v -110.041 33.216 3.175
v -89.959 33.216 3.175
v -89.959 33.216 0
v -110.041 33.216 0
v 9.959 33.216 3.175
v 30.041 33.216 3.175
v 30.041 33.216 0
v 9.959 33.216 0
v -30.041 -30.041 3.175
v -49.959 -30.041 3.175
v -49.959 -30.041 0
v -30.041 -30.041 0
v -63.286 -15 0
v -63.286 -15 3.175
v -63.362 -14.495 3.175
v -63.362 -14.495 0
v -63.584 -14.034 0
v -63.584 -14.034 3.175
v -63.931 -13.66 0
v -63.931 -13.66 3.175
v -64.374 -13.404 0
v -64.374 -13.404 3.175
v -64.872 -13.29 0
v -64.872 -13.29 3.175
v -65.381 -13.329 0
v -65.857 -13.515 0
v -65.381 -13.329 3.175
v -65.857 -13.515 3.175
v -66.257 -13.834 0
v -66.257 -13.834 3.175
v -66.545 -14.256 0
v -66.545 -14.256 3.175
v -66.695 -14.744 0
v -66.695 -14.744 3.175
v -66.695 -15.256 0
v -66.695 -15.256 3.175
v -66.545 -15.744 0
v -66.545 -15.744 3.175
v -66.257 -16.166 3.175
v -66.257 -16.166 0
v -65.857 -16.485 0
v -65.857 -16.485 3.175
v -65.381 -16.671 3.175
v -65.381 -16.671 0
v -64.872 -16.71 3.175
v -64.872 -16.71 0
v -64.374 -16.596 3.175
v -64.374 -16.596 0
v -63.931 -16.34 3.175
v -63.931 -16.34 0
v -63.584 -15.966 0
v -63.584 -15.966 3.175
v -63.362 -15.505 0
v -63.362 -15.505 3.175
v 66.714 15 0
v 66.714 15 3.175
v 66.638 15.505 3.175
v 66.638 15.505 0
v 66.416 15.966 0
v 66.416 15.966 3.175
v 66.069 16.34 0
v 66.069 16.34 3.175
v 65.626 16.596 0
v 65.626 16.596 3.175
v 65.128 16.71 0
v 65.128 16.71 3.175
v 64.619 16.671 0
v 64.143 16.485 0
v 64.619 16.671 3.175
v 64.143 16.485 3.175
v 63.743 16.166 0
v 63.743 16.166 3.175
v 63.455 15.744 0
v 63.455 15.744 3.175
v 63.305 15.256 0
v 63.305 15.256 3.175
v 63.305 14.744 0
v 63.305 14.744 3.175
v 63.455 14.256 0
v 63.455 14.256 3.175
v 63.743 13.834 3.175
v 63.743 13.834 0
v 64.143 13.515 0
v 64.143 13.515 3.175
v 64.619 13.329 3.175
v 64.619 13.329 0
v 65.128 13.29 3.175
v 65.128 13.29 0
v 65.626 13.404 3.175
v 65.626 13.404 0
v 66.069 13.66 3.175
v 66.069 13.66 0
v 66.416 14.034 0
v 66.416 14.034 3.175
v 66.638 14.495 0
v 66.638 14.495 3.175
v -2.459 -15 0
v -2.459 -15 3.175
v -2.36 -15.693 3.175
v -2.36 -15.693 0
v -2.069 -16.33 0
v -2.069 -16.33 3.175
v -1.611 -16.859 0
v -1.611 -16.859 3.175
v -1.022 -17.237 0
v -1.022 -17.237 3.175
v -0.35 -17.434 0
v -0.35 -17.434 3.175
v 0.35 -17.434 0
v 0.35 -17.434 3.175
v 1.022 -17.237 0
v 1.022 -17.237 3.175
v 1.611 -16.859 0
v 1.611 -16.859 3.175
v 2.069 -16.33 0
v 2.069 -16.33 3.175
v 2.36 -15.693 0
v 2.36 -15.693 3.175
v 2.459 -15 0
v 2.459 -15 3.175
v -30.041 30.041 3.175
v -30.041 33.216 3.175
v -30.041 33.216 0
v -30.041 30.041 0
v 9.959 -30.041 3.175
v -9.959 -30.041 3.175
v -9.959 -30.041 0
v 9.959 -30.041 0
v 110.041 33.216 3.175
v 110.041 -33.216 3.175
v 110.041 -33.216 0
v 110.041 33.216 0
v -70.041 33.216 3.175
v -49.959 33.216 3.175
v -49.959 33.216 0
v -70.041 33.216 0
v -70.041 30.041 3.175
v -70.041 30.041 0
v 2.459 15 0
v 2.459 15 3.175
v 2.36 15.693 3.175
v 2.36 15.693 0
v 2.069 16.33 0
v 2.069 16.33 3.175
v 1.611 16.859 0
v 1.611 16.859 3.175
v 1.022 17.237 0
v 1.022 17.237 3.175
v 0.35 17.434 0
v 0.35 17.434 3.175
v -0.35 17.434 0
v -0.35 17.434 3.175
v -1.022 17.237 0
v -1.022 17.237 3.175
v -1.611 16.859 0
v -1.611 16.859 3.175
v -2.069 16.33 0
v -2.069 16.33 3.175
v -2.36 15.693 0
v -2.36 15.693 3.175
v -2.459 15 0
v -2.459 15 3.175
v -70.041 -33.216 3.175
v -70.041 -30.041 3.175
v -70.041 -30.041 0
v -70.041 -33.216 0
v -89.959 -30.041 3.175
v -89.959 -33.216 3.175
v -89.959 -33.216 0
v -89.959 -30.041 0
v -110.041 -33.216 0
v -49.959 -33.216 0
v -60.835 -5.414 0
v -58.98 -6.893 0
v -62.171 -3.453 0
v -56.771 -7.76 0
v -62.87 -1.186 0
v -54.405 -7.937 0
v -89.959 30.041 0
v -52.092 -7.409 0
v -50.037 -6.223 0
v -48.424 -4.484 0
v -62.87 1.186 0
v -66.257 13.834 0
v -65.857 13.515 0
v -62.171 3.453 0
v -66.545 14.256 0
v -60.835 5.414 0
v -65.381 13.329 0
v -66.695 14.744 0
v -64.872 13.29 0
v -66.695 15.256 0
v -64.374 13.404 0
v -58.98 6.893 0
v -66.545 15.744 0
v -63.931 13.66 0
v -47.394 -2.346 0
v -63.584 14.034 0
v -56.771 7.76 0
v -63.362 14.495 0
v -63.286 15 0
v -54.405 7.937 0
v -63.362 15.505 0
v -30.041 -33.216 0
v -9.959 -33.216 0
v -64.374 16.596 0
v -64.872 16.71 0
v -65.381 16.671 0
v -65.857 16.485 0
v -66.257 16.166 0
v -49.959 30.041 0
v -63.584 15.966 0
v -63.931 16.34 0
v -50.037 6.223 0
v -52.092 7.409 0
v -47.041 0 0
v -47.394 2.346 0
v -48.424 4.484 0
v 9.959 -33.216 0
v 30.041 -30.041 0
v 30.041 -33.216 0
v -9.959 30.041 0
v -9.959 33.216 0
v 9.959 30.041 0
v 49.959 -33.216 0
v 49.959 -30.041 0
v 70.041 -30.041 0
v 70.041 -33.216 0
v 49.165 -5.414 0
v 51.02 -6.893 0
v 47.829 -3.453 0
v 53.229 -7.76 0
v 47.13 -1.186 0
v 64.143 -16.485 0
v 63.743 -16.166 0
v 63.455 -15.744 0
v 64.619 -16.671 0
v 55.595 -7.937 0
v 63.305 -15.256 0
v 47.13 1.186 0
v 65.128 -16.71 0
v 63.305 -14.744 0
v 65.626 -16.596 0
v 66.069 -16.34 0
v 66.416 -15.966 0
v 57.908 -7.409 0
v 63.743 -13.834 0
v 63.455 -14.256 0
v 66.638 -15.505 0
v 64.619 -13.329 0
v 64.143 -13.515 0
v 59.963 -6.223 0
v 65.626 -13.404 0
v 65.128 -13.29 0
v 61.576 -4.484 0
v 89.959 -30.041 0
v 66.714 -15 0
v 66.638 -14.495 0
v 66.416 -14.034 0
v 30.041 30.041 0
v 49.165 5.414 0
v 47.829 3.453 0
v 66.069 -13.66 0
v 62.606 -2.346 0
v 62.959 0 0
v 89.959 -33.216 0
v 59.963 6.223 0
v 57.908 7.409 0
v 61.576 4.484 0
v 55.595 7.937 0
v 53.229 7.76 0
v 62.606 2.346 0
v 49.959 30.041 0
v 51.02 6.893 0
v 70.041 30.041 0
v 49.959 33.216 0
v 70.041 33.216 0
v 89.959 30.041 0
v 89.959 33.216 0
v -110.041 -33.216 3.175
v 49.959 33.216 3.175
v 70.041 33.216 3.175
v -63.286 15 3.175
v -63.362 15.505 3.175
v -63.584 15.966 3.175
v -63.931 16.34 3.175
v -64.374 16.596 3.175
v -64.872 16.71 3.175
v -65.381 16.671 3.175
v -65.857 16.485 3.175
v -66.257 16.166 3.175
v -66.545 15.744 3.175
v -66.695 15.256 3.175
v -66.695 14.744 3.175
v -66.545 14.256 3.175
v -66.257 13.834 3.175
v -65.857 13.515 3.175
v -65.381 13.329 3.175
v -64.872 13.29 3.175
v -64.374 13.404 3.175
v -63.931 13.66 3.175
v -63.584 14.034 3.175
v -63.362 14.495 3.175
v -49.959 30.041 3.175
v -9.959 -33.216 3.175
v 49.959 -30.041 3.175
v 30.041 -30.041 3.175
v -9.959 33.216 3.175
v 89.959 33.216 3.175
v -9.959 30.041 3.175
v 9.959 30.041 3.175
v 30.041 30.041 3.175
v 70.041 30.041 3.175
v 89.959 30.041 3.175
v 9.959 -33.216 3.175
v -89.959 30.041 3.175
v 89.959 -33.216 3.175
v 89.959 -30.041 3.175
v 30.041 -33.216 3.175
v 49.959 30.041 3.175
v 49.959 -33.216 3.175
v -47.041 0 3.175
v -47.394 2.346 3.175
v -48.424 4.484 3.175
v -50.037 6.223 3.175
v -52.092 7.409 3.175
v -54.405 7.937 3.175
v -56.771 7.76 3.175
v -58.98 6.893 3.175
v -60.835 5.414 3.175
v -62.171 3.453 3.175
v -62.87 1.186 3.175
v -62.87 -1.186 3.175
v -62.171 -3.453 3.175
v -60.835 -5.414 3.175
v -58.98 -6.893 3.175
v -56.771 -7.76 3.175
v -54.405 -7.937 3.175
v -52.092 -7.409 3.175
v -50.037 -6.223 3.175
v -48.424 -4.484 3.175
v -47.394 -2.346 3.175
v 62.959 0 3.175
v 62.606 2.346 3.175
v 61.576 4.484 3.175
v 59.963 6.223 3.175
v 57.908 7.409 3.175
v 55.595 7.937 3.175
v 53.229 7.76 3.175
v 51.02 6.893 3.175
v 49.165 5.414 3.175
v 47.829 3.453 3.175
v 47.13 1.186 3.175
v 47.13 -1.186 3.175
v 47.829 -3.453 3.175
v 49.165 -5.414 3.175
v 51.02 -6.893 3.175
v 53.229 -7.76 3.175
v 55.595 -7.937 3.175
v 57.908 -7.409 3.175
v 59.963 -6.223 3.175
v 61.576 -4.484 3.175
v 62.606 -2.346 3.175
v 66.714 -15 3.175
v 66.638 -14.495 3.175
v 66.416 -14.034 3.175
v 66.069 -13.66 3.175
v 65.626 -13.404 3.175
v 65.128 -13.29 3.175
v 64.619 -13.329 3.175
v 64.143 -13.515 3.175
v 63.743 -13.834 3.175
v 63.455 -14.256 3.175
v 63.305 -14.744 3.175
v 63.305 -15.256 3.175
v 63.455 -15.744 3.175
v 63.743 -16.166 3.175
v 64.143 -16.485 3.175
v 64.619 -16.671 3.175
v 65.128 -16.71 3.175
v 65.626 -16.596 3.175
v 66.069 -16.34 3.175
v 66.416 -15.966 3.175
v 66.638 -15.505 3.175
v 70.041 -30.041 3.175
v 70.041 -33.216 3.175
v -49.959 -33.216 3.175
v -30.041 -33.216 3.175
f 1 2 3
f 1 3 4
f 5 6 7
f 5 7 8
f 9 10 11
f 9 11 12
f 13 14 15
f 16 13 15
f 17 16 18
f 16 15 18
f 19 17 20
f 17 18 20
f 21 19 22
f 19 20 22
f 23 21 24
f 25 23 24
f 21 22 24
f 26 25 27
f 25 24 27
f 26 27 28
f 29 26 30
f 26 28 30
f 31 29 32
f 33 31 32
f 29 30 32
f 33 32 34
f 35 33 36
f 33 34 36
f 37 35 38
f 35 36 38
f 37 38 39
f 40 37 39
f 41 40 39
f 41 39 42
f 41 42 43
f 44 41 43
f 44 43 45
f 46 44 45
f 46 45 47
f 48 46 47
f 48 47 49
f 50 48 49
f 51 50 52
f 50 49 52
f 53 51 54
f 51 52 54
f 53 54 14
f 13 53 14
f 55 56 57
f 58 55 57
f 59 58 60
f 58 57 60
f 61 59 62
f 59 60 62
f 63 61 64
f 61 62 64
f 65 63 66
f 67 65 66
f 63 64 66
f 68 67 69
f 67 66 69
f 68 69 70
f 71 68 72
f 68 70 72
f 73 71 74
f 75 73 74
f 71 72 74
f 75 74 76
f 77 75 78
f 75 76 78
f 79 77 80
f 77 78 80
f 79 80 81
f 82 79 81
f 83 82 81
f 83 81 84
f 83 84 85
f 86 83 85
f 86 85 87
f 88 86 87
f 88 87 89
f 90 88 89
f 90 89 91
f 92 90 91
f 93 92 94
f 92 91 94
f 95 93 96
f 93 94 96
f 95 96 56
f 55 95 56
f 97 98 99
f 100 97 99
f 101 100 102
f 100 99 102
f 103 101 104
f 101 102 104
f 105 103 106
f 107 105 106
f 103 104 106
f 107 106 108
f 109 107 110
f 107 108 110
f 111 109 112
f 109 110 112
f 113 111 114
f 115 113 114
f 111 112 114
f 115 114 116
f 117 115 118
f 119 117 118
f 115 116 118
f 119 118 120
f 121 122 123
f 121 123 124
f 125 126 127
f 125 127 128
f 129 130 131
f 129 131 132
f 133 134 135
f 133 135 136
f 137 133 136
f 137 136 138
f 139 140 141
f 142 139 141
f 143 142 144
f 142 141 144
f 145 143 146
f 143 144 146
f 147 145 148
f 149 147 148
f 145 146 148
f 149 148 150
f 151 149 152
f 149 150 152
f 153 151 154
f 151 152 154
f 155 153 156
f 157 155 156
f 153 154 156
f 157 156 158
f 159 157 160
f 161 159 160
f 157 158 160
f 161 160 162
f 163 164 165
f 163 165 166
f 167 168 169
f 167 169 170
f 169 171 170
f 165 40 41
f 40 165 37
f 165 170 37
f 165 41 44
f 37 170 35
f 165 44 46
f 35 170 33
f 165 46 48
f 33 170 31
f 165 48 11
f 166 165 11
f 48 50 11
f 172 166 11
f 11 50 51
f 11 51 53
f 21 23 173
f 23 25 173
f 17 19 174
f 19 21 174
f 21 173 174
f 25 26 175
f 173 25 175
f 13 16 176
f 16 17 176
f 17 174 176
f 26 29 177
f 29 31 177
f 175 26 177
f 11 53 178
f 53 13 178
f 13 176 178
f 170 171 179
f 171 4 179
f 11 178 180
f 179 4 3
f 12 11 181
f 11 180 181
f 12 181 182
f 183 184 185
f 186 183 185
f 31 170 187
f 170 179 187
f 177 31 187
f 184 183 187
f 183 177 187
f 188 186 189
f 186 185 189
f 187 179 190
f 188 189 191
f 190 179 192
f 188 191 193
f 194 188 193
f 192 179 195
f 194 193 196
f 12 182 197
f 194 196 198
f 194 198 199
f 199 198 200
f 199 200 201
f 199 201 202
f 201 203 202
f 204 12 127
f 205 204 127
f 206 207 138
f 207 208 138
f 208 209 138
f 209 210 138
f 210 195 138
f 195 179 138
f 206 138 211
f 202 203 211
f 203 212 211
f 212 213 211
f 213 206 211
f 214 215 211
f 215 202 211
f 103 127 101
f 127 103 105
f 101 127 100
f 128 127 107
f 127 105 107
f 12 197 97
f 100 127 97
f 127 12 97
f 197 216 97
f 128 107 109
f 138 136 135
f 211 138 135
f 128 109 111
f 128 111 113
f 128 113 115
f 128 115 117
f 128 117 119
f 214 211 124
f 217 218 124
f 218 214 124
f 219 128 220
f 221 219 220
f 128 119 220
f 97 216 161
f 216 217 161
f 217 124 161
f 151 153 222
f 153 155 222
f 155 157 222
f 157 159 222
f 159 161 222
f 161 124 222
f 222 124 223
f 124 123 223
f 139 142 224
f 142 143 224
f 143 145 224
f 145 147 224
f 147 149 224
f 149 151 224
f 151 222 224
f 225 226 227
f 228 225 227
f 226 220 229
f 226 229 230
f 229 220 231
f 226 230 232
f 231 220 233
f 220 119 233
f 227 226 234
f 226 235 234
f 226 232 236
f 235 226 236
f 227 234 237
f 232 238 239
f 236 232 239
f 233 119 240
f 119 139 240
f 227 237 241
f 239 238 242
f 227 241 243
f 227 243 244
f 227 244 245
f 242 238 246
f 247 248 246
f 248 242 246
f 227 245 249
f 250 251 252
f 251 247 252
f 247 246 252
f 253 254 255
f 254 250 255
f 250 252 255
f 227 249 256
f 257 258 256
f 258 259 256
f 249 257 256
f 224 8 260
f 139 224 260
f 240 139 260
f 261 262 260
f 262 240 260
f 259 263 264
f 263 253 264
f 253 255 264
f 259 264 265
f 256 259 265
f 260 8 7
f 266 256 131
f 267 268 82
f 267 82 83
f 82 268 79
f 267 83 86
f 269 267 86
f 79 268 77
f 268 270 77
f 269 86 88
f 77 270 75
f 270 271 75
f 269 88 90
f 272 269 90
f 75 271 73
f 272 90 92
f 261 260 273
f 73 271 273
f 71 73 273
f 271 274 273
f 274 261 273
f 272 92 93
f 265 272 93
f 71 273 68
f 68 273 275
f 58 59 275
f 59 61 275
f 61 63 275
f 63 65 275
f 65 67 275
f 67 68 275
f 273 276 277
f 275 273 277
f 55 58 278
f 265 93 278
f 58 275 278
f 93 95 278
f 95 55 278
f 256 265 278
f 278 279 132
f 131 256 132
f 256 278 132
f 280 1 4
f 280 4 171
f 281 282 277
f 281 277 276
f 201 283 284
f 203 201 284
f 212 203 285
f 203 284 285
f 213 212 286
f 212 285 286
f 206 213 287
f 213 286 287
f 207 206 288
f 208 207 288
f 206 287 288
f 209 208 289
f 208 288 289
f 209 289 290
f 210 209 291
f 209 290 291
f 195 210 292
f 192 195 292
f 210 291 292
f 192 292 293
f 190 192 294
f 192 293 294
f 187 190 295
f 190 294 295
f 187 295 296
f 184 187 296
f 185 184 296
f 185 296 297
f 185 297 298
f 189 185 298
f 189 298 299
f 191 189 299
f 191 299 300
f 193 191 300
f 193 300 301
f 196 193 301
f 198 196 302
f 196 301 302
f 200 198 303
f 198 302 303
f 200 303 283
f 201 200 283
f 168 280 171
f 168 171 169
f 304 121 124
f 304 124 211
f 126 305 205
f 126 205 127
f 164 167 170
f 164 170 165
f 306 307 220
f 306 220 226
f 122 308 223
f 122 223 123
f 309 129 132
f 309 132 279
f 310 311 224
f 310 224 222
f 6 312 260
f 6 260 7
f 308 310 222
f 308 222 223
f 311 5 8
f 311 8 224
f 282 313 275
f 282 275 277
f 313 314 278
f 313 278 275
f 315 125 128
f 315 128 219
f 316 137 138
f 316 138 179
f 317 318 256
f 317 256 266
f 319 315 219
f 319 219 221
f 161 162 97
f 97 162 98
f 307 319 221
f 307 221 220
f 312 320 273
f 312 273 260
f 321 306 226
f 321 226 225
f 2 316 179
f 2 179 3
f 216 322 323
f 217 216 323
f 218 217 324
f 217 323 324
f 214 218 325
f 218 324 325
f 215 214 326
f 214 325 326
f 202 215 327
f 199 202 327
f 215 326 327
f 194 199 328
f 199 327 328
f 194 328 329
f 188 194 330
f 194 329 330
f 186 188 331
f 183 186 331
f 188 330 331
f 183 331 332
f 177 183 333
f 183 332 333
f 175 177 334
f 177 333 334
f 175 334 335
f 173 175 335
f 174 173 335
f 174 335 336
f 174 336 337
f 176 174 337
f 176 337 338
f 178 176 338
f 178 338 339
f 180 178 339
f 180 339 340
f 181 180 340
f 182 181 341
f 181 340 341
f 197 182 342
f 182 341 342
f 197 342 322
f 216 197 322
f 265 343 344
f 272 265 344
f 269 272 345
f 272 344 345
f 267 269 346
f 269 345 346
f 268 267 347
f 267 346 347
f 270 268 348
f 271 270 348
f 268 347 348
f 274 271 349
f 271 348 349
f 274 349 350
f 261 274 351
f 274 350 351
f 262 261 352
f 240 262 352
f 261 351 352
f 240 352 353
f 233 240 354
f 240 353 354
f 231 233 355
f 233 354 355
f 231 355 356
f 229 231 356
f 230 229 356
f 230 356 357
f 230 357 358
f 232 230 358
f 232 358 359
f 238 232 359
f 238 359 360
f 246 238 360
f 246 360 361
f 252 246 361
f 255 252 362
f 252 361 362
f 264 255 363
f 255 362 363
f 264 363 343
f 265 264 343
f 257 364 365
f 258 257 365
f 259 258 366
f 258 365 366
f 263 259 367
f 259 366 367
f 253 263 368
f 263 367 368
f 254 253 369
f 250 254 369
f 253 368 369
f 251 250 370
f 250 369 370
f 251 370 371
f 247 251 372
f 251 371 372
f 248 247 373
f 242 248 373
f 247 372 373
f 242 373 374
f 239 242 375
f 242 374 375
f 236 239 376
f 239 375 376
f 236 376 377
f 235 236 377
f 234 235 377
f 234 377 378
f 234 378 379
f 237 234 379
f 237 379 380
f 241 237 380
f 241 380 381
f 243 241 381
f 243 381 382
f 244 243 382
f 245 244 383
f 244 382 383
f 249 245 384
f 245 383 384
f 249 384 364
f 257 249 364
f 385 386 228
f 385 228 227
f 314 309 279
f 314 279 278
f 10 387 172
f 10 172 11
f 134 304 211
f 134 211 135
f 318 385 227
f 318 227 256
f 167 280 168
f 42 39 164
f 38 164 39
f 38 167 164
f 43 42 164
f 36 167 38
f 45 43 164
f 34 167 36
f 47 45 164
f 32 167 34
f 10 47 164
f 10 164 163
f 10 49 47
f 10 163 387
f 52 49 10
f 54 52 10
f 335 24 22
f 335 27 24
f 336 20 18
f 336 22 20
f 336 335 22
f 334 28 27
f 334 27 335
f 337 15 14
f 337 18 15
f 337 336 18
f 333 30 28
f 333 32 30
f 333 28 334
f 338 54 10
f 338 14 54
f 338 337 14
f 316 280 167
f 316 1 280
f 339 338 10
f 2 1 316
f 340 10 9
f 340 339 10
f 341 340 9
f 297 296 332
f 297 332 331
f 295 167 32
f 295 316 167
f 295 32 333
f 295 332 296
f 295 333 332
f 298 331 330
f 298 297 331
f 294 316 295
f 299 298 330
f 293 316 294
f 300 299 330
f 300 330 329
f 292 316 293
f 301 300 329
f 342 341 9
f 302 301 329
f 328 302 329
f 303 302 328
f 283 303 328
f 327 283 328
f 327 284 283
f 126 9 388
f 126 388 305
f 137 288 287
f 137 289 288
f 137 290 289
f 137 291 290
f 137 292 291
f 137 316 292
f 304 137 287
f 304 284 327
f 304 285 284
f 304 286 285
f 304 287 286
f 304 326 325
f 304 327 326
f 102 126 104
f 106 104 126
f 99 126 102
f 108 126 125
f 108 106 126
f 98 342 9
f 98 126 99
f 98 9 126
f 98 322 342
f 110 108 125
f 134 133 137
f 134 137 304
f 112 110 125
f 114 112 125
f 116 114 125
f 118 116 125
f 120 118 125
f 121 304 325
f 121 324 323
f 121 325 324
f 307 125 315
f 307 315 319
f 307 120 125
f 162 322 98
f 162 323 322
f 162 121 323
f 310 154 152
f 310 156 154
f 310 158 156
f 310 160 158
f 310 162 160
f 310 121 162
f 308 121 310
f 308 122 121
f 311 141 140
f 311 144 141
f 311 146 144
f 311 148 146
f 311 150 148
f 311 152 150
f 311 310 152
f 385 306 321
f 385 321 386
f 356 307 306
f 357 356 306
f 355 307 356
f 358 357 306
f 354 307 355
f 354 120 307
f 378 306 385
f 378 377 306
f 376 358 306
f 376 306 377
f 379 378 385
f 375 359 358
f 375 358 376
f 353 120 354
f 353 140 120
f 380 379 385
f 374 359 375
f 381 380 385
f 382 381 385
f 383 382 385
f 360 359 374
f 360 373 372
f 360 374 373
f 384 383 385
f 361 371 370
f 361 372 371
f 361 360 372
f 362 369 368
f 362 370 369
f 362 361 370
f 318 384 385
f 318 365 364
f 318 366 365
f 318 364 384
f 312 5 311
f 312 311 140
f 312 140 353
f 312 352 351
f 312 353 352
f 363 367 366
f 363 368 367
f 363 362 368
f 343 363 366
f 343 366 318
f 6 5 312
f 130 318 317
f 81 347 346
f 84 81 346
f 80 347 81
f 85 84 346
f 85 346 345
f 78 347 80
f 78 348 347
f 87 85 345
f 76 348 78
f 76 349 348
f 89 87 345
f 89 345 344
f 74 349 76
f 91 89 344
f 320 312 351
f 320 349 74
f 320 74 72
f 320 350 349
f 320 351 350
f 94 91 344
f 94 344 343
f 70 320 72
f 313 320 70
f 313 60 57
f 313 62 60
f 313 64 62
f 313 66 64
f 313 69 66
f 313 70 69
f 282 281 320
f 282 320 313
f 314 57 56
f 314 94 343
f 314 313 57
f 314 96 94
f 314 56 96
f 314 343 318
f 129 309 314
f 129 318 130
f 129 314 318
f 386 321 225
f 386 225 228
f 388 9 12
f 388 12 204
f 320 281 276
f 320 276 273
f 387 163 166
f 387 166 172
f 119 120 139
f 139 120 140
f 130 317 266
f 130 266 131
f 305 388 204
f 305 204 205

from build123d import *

# Parameters (mm, degrees)
SKETCH1_R           = 1.755
SKETCH1_R_2         = 8
BOSS_EXTRUDE1_DEPTH = 3.175
SKETCH2_R           = 7.95936
SKETCH2_R_2         = 1.71436
BOSS_EXTRUDE2_DEPTH = 3.175


with BuildPart() as part:
    # Sketch1 → Boss-Extrude1 (new body)
    with BuildSketch(Plane.XY):
        Polygon((-50, 30), (-50, 33.175), (-70, 33.175), (-70, 30), (-90, 30), (-90, 33.175), (-110, 33.175), (-110, -33.175), (-90, -33.175), (-90, -30), (-70, -30), (-70, -33.175), (-50, -33.175), (-50, -30), (-30, -30), (-30, -33.175), (-10, -33.175), (-10, -30), (10, -30), (10, -33.175), (30, -33.175), (30, -30), (50, -30), (50, -33.175), (70, -33.175), (70, -30), (90, -30), (90, -33.175), (110, -33.175), (110, 33.175), (90, 33.175), (90, 30), (70, 30), (70, 33.175), (50, 33.175), (50, 30), (30, 30), (30, 33.175), (10, 33.175), (10, 30), (-10, 30), (-10, 33.175), (-30, 33.175), (-30, 30), align=None)
        with Locations((-65, -15)):
            Circle(SKETCH1_R, mode=Mode.SUBTRACT)
        with Locations((65, -15)):
            Circle(SKETCH1_R, mode=Mode.SUBTRACT)
        with Locations((-65, 15)):
            Circle(SKETCH1_R, mode=Mode.SUBTRACT)
        with Locations((-55, 0)):
            Circle(SKETCH1_R_2, mode=Mode.SUBTRACT)
        with BuildLine():
            ThreePointArc((2.5, -15), (0, -17.5), (-2.5, -15))
            Line((-2.5, -15), (-2.5, 15))
            ThreePointArc((-2.5, 15), (0, 17.5), (2.5, 15))
            Line((2.5, 15), (2.5, -15))
        make_face(mode=Mode.SUBTRACT)
        with Locations((55, 0)):
            Circle(SKETCH1_R_2, mode=Mode.SUBTRACT)
        with Locations((65, 15)):
            Circle(SKETCH1_R, mode=Mode.SUBTRACT)
    extrude(amount=BOSS_EXTRUDE1_DEPTH)

    # Sketch2 → Boss-Extrude2 (add)
    with BuildSketch(Plane.XY.offset(3.175)):
        Polygon((110.04064, -33.21564), (110.04064, 33.21564), (89.95936, 33.21564), (89.95936, 30.04064), (70.04064, 30.04064), (70.04064, 33.21564), (49.95936, 33.21564), (49.95936, 30.04064), (30.04064, 30.04064), (30.04064, 33.21564), (9.95936, 33.21564), (9.95936, 30.04064), (-9.95936, 30.04064), (-9.95936, 33.21564), (-30.04064, 33.21564), (-30.04064, 30.04064), (-49.95936, 30.04064), (-49.95936, 33.21564), (-70.04064, 33.21564), (-70.04064, 30.04064), (-89.95936, 30.04064), (-89.95936, 33.21564), (-110.04064, 33.21564), (-110.04064, -33.21564), (-89.95936, -33.21564), (-89.95936, -30.04064), (-70.04064, -30.04064), (-70.04064, -33.21564), (-49.95936, -33.21564), (-49.95936, -30.04064), (-30.04064, -30.04064), (-30.04064, -33.21564), (-9.95936, -33.21564), (-9.95936, -30.04064), (9.95936, -30.04064), (9.95936, -33.21564), (30.04064, -33.21564), (30.04064, -30.04064), (49.95936, -30.04064), (49.95936, -33.21564), (70.04064, -33.21564), (70.04064, -30.04064), (89.95936, -30.04064), (89.95936, -33.21564), align=None)
        with Locations((-55, 0)):
            Circle(SKETCH2_R, mode=Mode.SUBTRACT)
        with Locations((-65, 15)):
            Circle(SKETCH2_R_2, mode=Mode.SUBTRACT)
        with Locations((-65, -15)):
            Circle(SKETCH2_R_2, mode=Mode.SUBTRACT)
        with Locations((55, 0)):
            Circle(SKETCH2_R, mode=Mode.SUBTRACT)
        with Locations((65, 15)):
            Circle(SKETCH2_R_2, mode=Mode.SUBTRACT)
        with Locations((65, -15)):
            Circle(SKETCH2_R_2, mode=Mode.SUBTRACT)
        with BuildLine():
            Line((2.45936, -15), (2.45936, 15))
            ThreePointArc((2.45936, 15), (0, 17.45936), (-2.45936, 15))
            Line((-2.45936, 15), (-2.45936, -15))
            ThreePointArc((-2.45936, -15), (0, -17.45936), (2.45936, -15))
        make_face(mode=Mode.SUBTRACT)
    extrude(amount=-BOSS_EXTRUDE2_DEPTH)


solid = part.part
